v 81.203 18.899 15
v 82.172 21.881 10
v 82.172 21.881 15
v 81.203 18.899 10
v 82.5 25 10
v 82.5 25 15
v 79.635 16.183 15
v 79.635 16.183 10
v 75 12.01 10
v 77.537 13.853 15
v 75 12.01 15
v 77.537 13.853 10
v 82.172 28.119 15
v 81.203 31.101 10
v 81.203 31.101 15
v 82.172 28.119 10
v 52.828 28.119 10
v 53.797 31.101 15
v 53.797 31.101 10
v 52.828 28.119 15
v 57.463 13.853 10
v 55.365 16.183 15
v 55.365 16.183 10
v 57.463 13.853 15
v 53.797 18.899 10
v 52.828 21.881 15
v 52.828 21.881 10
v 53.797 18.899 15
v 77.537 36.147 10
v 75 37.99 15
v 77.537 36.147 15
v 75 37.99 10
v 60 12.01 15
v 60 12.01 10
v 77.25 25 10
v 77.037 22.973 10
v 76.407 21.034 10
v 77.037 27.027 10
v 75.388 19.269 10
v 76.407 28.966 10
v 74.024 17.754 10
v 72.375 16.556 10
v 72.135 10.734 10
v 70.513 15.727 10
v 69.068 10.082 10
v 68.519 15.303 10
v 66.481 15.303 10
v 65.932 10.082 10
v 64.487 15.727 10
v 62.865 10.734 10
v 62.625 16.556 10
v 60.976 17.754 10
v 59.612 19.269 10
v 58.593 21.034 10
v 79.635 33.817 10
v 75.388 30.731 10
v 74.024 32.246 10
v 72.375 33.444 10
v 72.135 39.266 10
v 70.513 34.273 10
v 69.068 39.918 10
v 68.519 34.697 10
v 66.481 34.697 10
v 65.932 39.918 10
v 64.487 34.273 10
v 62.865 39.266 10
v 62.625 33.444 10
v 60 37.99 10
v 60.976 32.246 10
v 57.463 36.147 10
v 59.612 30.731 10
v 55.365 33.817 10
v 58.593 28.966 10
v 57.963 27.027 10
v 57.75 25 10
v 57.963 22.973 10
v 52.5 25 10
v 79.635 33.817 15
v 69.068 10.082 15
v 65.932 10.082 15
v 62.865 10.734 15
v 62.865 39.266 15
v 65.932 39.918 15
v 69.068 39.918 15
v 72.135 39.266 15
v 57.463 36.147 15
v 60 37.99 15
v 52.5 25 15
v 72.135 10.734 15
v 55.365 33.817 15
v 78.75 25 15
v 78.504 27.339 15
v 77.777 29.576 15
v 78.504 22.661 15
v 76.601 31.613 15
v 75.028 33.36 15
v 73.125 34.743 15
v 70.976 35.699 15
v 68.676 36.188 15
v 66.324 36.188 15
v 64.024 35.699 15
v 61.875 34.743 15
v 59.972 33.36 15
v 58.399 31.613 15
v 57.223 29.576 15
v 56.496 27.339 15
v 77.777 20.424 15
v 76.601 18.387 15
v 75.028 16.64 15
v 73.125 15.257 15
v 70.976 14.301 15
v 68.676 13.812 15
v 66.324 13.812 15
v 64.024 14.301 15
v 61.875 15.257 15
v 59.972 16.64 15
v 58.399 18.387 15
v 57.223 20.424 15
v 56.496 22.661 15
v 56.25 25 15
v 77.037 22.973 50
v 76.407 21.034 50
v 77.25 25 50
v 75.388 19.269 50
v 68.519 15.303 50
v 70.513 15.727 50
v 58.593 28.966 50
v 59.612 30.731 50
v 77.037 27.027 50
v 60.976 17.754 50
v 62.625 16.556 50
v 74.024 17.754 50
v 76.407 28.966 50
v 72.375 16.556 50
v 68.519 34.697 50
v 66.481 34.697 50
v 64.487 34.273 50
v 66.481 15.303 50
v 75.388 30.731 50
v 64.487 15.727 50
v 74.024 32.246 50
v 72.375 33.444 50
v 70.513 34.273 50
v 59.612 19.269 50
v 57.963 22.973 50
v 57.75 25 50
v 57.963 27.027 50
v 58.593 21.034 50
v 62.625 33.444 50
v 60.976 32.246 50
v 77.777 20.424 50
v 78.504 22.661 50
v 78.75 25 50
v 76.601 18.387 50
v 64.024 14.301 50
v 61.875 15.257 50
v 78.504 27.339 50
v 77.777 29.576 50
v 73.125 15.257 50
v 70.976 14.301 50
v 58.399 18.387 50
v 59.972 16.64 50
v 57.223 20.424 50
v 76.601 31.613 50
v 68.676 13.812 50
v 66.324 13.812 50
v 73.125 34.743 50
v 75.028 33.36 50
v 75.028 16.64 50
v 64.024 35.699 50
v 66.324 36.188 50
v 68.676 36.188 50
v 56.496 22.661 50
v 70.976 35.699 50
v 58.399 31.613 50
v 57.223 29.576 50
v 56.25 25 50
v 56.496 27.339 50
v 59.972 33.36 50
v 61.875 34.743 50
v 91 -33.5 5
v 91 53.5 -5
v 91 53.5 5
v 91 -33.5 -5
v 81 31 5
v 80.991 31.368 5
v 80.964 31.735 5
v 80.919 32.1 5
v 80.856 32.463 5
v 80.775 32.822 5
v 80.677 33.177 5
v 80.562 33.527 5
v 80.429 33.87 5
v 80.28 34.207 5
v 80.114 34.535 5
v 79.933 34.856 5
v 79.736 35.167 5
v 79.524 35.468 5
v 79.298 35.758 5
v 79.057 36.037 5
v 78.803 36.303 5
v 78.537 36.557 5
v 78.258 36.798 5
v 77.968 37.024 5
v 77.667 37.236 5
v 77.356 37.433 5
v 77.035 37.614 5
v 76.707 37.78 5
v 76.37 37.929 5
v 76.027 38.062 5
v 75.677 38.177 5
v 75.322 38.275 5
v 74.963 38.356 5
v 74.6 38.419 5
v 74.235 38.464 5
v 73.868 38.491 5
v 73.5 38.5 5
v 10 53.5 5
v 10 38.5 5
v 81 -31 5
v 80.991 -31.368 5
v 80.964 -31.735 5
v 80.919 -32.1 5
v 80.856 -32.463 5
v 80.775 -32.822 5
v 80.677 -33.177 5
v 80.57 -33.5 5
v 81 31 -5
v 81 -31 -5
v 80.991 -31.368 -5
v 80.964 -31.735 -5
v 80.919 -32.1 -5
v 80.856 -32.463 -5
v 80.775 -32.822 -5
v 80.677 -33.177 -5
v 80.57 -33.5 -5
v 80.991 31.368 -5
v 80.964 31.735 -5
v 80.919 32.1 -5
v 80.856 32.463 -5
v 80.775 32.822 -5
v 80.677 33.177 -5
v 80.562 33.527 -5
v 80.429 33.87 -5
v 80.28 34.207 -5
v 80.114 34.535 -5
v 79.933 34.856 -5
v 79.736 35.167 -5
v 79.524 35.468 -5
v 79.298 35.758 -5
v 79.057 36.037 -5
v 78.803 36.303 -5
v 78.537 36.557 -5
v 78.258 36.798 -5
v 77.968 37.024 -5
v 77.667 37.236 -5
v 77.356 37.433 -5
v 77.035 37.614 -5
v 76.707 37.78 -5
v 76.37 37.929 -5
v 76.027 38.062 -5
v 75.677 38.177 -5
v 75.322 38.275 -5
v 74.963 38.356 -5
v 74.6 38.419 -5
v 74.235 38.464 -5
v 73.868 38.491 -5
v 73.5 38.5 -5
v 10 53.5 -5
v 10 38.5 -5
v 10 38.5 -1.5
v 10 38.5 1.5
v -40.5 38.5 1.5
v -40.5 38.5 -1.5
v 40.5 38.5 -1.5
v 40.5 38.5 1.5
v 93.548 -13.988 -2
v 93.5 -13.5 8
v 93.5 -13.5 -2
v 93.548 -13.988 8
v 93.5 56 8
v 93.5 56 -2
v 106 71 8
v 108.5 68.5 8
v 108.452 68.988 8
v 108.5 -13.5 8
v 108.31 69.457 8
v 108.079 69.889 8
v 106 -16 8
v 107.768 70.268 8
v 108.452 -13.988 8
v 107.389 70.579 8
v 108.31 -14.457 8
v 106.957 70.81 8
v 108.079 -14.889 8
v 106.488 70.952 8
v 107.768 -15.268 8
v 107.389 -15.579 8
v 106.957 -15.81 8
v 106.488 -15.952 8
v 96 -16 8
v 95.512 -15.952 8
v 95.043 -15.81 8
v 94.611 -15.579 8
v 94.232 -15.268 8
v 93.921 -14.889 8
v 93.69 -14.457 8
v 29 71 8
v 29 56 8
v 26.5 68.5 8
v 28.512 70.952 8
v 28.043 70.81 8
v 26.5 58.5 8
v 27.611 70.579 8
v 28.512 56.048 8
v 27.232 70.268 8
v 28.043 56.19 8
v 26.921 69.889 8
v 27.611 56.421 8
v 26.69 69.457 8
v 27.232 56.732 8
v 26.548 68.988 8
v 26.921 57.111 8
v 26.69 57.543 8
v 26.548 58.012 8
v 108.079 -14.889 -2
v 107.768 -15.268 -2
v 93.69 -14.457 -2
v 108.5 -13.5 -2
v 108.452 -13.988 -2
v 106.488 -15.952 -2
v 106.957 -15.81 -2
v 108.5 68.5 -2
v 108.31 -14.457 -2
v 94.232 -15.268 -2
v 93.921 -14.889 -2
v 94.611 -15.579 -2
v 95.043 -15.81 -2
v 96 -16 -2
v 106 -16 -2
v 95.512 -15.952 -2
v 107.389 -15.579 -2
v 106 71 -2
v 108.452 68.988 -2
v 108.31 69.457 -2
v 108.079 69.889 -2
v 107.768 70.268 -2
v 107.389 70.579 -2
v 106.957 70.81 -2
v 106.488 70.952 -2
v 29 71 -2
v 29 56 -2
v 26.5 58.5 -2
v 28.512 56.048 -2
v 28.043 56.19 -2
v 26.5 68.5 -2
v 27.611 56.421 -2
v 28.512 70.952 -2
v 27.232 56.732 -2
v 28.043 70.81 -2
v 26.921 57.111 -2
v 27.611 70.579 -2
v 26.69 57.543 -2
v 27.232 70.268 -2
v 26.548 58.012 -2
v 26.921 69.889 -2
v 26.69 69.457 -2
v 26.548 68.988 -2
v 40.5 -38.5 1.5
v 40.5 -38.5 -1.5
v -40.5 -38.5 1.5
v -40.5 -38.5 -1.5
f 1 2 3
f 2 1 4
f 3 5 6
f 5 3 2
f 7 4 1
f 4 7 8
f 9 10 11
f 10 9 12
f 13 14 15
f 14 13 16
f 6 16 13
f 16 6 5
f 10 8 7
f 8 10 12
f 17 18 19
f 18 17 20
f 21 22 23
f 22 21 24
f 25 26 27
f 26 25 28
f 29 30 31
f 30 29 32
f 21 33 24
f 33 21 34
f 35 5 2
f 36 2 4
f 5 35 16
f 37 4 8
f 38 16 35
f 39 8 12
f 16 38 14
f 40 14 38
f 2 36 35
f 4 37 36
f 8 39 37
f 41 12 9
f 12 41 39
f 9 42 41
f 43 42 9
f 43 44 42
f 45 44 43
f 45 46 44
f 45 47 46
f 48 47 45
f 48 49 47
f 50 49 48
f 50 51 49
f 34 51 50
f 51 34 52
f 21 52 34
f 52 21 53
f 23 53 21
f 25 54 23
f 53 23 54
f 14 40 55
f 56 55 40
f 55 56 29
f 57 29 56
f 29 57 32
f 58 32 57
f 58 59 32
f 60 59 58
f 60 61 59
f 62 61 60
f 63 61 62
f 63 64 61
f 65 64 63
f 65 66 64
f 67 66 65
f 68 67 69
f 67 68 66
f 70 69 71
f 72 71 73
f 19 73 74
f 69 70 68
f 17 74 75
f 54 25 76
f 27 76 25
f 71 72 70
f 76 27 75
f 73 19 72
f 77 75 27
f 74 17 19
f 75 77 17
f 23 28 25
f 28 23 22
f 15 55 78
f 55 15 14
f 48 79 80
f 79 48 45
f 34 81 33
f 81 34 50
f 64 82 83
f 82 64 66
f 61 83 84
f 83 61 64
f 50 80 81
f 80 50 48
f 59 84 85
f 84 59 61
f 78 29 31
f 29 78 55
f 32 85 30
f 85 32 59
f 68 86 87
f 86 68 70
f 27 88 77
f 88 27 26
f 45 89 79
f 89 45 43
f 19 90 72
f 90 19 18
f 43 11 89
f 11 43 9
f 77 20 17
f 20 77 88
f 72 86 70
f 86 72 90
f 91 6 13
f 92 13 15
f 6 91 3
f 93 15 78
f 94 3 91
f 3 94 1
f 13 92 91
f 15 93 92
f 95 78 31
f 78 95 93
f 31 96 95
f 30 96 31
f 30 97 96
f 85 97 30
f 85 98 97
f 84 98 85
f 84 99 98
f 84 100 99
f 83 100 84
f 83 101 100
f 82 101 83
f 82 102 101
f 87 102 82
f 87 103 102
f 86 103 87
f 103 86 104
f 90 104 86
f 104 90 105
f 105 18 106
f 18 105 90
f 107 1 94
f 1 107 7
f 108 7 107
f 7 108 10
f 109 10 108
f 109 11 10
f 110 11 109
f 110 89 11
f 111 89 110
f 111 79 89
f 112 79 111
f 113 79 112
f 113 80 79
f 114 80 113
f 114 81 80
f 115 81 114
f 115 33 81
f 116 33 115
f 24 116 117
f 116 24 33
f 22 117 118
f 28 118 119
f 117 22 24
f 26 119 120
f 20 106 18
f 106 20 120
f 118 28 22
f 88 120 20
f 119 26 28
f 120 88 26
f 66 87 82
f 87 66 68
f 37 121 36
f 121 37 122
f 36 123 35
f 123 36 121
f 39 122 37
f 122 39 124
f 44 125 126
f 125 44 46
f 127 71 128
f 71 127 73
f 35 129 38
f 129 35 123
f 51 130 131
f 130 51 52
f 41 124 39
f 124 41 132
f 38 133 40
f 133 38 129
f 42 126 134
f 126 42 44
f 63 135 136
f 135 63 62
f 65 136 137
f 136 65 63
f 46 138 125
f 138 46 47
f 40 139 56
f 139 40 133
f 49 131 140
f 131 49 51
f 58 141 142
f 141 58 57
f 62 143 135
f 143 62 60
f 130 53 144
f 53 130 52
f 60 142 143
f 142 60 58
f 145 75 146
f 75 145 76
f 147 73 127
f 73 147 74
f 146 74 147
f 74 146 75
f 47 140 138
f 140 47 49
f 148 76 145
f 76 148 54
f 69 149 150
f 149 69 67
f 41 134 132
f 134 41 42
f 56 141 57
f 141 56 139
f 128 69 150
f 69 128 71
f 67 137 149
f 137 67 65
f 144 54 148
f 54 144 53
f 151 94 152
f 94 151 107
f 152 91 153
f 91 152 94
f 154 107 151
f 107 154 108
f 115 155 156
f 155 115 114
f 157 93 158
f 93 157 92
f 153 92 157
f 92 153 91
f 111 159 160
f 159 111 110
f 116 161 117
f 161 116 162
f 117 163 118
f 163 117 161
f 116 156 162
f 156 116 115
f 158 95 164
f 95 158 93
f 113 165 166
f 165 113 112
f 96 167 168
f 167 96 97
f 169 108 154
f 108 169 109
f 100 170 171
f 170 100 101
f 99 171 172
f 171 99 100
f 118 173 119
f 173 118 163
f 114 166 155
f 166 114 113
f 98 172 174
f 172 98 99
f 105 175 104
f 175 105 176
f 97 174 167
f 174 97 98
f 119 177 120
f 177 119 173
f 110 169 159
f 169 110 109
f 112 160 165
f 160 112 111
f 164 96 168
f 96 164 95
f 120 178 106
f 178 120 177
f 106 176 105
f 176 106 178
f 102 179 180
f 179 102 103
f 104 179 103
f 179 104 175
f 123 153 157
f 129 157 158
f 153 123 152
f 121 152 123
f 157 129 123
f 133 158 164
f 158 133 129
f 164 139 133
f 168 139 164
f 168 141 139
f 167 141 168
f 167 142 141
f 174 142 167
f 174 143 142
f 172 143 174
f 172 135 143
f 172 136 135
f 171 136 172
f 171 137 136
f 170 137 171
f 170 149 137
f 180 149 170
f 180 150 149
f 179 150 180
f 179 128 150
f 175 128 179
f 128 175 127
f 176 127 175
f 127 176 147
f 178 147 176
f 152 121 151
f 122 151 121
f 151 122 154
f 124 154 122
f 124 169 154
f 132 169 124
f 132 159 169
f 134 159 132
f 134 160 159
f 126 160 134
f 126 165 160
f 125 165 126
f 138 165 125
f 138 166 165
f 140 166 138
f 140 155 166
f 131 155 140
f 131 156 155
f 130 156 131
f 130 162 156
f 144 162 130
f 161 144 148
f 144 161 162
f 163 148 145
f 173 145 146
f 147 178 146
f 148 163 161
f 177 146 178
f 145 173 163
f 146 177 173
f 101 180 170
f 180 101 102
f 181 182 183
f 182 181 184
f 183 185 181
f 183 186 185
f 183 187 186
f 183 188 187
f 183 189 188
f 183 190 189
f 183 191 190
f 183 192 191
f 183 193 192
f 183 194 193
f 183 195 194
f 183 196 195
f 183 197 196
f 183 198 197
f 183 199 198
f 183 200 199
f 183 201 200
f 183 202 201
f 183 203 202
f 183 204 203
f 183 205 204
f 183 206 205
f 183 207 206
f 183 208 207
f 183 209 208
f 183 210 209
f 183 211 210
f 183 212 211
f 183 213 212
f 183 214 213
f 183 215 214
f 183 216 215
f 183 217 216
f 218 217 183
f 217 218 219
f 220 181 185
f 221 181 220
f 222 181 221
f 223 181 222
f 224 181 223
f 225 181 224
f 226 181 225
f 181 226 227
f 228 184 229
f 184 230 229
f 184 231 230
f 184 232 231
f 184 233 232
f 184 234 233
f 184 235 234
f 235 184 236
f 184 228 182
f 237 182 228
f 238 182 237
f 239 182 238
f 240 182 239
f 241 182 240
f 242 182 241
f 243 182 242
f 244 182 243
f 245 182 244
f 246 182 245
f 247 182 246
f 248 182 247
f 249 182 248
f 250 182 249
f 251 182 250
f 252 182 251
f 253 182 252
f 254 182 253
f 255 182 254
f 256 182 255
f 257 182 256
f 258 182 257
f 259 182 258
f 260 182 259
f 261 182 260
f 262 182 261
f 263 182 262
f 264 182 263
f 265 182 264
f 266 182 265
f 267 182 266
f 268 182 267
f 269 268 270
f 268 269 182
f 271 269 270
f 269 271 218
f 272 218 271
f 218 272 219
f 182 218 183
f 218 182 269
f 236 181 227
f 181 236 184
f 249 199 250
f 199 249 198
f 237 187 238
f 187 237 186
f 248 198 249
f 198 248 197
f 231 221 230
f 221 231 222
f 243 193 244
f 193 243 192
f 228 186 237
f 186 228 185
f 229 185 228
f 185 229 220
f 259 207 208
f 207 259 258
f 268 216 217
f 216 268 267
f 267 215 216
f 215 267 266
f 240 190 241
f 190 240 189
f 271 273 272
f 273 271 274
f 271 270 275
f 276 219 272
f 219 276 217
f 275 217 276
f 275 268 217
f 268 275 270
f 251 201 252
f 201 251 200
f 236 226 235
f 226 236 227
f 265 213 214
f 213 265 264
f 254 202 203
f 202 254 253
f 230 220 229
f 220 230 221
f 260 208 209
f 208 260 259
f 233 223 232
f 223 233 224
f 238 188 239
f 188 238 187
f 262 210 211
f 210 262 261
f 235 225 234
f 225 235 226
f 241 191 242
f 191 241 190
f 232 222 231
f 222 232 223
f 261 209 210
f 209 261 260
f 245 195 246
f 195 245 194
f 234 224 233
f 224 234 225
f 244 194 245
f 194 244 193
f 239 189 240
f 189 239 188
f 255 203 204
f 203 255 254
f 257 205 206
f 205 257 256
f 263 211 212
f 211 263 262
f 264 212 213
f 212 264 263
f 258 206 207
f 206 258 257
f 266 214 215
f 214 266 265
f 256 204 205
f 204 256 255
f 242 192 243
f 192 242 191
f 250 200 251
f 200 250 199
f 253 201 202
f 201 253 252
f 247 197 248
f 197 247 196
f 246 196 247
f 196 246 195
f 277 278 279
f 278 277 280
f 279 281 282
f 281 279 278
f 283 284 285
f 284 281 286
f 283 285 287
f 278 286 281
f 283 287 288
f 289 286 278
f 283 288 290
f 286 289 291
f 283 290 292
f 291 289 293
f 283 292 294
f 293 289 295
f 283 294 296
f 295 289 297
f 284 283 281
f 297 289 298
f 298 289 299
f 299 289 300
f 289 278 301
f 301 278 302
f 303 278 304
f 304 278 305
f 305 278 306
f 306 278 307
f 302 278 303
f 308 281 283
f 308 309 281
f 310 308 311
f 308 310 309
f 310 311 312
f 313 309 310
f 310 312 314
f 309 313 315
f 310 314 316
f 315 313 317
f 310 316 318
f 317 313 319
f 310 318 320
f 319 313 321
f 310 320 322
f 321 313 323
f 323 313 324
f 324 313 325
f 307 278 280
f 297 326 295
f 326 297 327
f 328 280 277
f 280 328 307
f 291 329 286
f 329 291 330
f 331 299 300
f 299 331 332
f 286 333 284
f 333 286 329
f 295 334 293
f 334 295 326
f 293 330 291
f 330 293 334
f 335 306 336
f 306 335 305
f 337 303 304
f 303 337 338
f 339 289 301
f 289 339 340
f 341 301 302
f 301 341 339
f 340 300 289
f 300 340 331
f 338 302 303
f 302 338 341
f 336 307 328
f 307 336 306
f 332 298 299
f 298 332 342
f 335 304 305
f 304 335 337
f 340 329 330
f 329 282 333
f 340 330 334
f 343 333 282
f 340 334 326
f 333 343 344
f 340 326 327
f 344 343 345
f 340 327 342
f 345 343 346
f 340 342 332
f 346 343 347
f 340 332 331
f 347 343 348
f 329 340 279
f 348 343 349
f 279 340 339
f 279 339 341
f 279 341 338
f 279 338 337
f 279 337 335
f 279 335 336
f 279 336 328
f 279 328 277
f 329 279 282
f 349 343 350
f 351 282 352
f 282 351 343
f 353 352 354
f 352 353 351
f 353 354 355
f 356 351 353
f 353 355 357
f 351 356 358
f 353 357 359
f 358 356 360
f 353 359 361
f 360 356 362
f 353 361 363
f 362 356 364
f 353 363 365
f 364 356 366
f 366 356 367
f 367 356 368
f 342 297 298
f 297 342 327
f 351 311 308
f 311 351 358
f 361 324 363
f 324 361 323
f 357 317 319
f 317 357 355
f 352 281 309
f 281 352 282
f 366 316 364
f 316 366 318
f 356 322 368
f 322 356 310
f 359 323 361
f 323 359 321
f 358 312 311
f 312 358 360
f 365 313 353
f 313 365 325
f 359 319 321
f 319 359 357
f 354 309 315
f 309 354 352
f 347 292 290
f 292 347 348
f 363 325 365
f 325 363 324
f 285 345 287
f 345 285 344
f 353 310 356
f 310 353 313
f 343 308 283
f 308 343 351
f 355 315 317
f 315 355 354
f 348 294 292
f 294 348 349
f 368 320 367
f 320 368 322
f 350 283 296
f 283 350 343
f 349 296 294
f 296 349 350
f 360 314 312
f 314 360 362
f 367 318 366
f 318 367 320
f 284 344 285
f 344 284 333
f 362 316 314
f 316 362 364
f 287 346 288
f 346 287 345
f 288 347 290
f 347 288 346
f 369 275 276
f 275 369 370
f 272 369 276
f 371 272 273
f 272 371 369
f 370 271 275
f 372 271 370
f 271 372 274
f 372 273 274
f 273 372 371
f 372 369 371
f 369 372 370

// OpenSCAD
// file: ocular.scad
ocular();

module top(){
    difference(){
        cylinder(d=30, h=5, center=true);
        cylinder(d=23-0.5-3, h=15, center=true);
    }
}
module ocular(){
    translate([0,0,35/2+5/2])
    top();
    difference(){
        cylinder(d=23-0.5, h = 35, center = true);
        cylinder(d=23-0.5-3, h = 40, center = true);
    }
}
// file: smartphone.scad
$fn = 128;
r_round_corner = 15;

module smartphone(){
    block();
    cameras();
}

module cameras(){
    color("blue")
    translate([162/2-13,77/2-13,0])
    cylinder(d=14,h=15, center=true);
    
    color("blue")
    translate([162/2-30,77/2-13,0])
    cylinder(d=14,h=15, center=true);
    
    color("blue")
    translate([162/2-47,77/2-13,0])
    cylinder(d=14,h=15, center=true);
}


module block(){
    hull(){
        color("red")
        translate([162/2 - r_round_corner/2,77/2 - r_round_corner/2,0])
        cylinder(d=r_round_corner, h=9,center=true);
        
        mirror([1,0,0])
        color("red")
        translate([162/2 - r_round_corner/2,77/2 - r_round_corner/2,0])
        cylinder(d=r_round_corner, h=9,center=true);
        
        mirror([0,1,0])
        color("red")
        translate([162/2 - r_round_corner/2,77/2 - r_round_corner/2,0])
        cylinder(d=r_round_corner, h=9,center=true);
        
        mirror([1,0,0])
        mirror([0,1,0])
        color("red")
        translate([162/2 - r_round_corner/2,77/2 - r_round_corner/2,0])
        cylinder(d=r_round_corner, h=9,center=true);
    }
}
// main file
use <smartphone.scad>
use <ocular.scad>
phone_height = 162;
phone_width = 77;

translate([phone_height/2-23/2-2, phone_width/2-23/2-2, 35/2+15])
rotate ([180, 0, 0])
ocular ();
frame1();
translate ([0,25,3])
corner (thickness = 20);

cube([phone_height/2, phone_width, 3], center = true);

module corner(){
    translate([162/2+20,0,0])
    frame2();
   
    translate([162/2 - 13.5, 77/2,0])
    rotate([0,0,90])
    frame2();

}

module frame2(){
    hull(){
        translate([5,77/2,0])
        cylinder(d=5, h=10,center=true,$fn=32);
        
        mirror([1,0,0])
        translate([5,77/2,0])
        cylinder(d=5, h=10,center=true,$fn=32);
        
        mirror([0,1,0])
        translate([5,77/2,0])
        cylinder(d=5, h=10,center=true,$fn=32);
        
        mirror([1,0,0])
        mirror([0,1,0])
        translate([5,77/2,0])
        cylinder(d=5, h=10,center=true,$fn=32);
    }
}

module frame1(){
    difference(){
        color("green")
        translate([162/2-162/4+10,10,0])
        cube([162/2,77+10, 10], center=true);
        scale([1,1,2])
        block();
    }
}
